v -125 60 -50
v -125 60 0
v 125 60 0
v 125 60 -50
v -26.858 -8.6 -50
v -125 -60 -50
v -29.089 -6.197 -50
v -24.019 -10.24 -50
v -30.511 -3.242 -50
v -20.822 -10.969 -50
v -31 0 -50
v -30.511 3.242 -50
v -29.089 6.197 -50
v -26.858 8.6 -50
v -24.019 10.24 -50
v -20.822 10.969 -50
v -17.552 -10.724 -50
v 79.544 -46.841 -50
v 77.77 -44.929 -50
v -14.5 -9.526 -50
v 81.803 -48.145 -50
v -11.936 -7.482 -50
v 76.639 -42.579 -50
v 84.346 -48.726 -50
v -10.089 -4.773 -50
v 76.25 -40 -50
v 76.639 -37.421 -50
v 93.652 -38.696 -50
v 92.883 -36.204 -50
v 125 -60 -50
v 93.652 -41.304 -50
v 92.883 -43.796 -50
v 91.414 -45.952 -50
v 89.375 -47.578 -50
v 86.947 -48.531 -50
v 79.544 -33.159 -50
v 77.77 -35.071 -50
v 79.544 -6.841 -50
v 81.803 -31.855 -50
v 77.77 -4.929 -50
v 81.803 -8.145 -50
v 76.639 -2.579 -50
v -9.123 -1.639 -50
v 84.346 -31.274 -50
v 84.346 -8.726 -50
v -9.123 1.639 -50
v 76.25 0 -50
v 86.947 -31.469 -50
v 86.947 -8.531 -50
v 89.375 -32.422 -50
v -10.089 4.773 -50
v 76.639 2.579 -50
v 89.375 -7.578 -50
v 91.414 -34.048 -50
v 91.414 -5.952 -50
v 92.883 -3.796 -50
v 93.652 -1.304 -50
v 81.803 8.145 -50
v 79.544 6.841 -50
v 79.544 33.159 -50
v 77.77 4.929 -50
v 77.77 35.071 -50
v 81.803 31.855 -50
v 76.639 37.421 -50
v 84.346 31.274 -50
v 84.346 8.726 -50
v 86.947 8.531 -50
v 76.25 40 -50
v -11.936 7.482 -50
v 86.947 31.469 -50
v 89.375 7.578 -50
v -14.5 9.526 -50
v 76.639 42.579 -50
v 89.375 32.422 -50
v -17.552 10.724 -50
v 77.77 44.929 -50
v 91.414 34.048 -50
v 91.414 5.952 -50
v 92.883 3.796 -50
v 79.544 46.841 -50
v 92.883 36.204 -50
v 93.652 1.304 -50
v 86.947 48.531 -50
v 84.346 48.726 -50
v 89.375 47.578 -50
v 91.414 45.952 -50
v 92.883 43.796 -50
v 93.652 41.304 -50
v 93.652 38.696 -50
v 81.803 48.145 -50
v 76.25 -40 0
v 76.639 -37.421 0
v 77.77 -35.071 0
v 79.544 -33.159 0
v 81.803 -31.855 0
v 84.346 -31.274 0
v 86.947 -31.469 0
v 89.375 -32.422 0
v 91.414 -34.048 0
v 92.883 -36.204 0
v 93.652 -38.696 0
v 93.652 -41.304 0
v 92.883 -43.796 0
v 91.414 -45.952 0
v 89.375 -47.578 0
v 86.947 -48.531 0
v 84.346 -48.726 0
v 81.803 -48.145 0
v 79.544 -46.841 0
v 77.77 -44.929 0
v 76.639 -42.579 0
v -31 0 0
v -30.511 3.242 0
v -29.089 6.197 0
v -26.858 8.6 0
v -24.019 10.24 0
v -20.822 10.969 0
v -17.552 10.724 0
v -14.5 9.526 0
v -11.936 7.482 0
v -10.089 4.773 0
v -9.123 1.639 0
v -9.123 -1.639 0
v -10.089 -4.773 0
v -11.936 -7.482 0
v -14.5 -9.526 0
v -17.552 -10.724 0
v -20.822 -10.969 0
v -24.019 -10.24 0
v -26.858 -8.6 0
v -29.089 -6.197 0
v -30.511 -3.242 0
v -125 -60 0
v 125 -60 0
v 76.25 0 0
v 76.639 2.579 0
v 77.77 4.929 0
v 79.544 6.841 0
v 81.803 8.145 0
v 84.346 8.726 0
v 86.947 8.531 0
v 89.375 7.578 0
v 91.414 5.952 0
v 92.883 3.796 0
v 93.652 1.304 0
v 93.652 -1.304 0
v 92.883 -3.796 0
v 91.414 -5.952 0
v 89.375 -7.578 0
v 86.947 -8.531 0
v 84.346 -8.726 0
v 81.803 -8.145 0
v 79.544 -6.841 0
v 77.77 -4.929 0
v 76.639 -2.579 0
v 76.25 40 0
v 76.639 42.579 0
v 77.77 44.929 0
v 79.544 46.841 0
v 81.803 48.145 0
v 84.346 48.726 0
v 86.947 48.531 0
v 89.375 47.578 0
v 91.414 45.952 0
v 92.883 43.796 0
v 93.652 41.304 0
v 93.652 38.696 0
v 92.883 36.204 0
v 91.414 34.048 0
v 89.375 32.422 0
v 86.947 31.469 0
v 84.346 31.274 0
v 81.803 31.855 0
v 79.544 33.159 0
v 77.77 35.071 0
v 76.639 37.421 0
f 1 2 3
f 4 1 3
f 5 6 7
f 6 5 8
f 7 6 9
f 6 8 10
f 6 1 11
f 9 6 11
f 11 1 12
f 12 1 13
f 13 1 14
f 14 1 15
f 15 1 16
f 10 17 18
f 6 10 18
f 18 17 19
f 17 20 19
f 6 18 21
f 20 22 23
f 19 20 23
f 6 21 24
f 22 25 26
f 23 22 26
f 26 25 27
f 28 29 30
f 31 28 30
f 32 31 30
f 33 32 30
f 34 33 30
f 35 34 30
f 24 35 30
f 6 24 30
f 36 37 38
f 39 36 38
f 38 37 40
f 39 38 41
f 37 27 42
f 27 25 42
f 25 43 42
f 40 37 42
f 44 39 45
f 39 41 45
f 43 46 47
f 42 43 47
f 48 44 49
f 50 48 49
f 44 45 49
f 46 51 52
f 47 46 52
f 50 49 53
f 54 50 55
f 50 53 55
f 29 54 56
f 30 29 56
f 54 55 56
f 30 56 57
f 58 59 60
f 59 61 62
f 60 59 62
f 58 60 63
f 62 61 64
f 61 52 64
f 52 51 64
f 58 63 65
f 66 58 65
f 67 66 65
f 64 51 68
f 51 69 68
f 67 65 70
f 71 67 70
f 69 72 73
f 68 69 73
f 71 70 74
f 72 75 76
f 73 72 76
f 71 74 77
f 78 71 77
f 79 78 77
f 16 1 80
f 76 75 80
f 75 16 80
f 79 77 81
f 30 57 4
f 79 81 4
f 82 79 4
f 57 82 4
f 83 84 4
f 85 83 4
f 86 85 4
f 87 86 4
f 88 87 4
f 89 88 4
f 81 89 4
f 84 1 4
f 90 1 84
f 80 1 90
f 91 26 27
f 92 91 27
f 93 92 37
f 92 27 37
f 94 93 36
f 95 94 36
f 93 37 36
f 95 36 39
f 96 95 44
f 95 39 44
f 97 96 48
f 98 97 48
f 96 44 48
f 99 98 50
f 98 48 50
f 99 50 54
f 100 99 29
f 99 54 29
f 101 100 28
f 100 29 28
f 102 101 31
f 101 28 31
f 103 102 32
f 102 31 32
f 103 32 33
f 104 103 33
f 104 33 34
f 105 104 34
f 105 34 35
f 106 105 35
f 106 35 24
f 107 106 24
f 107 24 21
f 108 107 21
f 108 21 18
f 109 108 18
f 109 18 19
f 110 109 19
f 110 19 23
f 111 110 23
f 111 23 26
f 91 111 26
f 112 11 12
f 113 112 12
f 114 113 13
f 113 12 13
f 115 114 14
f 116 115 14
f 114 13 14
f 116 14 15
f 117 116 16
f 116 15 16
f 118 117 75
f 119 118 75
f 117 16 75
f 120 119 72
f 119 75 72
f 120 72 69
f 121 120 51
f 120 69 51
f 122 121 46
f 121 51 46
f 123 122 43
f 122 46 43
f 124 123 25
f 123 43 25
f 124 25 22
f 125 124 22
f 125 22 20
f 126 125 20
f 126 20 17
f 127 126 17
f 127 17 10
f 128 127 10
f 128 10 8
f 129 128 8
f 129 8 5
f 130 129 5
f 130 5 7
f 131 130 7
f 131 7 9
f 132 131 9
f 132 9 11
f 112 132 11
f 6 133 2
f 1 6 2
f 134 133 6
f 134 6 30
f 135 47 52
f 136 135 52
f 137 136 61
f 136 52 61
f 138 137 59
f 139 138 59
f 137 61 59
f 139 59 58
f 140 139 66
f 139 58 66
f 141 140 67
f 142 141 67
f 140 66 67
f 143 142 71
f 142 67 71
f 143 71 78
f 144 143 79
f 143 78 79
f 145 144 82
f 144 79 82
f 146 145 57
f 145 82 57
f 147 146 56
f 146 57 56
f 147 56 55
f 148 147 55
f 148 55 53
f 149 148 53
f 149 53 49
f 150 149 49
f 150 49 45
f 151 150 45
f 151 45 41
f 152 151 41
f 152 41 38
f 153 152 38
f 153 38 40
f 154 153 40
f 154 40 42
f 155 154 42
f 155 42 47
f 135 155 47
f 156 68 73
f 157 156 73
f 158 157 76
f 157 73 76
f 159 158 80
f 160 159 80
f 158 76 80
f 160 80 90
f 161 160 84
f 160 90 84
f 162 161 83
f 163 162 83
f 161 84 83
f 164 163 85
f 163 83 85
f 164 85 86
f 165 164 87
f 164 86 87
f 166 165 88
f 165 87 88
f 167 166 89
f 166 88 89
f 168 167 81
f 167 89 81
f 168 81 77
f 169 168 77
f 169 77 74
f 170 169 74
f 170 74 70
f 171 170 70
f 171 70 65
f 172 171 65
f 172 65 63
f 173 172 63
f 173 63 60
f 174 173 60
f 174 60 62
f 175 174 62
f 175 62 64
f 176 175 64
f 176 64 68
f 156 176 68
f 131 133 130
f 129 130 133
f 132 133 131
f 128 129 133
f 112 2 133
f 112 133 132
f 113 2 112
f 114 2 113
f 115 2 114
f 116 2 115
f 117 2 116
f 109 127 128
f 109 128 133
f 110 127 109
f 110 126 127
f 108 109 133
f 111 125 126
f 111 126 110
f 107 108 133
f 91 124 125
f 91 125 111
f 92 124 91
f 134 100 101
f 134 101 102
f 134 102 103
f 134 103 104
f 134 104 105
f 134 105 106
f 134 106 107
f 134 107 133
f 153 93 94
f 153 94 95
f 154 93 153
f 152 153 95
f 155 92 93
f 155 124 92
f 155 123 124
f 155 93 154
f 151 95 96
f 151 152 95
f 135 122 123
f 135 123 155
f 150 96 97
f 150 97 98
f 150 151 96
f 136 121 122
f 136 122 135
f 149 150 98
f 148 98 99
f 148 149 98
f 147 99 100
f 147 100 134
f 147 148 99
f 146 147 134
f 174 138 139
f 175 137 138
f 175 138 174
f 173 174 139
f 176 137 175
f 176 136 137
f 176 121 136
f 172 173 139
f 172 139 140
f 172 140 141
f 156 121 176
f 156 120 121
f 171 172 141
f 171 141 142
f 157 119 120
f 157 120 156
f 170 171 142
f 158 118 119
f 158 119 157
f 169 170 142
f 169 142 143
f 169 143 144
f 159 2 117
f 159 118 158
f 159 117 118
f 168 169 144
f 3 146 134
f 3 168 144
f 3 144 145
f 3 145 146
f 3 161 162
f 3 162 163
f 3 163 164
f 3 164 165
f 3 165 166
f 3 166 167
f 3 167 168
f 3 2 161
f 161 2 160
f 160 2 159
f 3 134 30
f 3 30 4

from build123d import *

# Parameters (mm, degrees)
SKETCH1_W                  = 250
SKETCH1_H                  = 120
BOSS_EXTRUDE1_DEPTH        = 50
F_22_0_22_DIAMETER_HOLE1_D = 22
M20_TAPPED_HOLE1_D         = 17.5
LPATTERN1_COUNT            = 2
LPATTERN1_PITCH            = 40
LPATTERN1_COL_COUNT        = 2
LPATTERN1_COL_PITCH        = 40


with BuildPart() as part:
    # Sketch1 → Boss-Extrude1 (new body)
    with BuildSketch(Plane.XY):
        Rectangle(SKETCH1_W, SKETCH1_H)
    extrude(amount=-BOSS_EXTRUDE1_DEPTH)

    # Ø22.0 (22) Diameter Hole1 (through all)
    with Locations(Plane.XY):
        with Locations((-20, 0)):
            Hole(F_22_0_22_DIAMETER_HOLE1_D / 2)

    # M20 Tapped Hole1 (through all)
    with Locations(Plane.XY):
        with Locations((85, 0)):
            m20_tapped_hole1 = Hole(M20_TAPPED_HOLE1_D / 2)

    # LPattern1: M20 Tapped Hole1 ×2
    with Locations(*[(0, -i * LPATTERN1_PITCH, 0) for i in range(1, LPATTERN1_COUNT)]):
        add(m20_tapped_hole1, mode=Mode.SUBTRACT)

    # LPattern1 col: M20 Tapped Hole1 ×2
    with Locations(*[(0, i * LPATTERN1_COL_PITCH, 0) for i in range(1, LPATTERN1_COL_COUNT)]):
        add(m20_tapped_hole1, mode=Mode.SUBTRACT)


solid = part.part
